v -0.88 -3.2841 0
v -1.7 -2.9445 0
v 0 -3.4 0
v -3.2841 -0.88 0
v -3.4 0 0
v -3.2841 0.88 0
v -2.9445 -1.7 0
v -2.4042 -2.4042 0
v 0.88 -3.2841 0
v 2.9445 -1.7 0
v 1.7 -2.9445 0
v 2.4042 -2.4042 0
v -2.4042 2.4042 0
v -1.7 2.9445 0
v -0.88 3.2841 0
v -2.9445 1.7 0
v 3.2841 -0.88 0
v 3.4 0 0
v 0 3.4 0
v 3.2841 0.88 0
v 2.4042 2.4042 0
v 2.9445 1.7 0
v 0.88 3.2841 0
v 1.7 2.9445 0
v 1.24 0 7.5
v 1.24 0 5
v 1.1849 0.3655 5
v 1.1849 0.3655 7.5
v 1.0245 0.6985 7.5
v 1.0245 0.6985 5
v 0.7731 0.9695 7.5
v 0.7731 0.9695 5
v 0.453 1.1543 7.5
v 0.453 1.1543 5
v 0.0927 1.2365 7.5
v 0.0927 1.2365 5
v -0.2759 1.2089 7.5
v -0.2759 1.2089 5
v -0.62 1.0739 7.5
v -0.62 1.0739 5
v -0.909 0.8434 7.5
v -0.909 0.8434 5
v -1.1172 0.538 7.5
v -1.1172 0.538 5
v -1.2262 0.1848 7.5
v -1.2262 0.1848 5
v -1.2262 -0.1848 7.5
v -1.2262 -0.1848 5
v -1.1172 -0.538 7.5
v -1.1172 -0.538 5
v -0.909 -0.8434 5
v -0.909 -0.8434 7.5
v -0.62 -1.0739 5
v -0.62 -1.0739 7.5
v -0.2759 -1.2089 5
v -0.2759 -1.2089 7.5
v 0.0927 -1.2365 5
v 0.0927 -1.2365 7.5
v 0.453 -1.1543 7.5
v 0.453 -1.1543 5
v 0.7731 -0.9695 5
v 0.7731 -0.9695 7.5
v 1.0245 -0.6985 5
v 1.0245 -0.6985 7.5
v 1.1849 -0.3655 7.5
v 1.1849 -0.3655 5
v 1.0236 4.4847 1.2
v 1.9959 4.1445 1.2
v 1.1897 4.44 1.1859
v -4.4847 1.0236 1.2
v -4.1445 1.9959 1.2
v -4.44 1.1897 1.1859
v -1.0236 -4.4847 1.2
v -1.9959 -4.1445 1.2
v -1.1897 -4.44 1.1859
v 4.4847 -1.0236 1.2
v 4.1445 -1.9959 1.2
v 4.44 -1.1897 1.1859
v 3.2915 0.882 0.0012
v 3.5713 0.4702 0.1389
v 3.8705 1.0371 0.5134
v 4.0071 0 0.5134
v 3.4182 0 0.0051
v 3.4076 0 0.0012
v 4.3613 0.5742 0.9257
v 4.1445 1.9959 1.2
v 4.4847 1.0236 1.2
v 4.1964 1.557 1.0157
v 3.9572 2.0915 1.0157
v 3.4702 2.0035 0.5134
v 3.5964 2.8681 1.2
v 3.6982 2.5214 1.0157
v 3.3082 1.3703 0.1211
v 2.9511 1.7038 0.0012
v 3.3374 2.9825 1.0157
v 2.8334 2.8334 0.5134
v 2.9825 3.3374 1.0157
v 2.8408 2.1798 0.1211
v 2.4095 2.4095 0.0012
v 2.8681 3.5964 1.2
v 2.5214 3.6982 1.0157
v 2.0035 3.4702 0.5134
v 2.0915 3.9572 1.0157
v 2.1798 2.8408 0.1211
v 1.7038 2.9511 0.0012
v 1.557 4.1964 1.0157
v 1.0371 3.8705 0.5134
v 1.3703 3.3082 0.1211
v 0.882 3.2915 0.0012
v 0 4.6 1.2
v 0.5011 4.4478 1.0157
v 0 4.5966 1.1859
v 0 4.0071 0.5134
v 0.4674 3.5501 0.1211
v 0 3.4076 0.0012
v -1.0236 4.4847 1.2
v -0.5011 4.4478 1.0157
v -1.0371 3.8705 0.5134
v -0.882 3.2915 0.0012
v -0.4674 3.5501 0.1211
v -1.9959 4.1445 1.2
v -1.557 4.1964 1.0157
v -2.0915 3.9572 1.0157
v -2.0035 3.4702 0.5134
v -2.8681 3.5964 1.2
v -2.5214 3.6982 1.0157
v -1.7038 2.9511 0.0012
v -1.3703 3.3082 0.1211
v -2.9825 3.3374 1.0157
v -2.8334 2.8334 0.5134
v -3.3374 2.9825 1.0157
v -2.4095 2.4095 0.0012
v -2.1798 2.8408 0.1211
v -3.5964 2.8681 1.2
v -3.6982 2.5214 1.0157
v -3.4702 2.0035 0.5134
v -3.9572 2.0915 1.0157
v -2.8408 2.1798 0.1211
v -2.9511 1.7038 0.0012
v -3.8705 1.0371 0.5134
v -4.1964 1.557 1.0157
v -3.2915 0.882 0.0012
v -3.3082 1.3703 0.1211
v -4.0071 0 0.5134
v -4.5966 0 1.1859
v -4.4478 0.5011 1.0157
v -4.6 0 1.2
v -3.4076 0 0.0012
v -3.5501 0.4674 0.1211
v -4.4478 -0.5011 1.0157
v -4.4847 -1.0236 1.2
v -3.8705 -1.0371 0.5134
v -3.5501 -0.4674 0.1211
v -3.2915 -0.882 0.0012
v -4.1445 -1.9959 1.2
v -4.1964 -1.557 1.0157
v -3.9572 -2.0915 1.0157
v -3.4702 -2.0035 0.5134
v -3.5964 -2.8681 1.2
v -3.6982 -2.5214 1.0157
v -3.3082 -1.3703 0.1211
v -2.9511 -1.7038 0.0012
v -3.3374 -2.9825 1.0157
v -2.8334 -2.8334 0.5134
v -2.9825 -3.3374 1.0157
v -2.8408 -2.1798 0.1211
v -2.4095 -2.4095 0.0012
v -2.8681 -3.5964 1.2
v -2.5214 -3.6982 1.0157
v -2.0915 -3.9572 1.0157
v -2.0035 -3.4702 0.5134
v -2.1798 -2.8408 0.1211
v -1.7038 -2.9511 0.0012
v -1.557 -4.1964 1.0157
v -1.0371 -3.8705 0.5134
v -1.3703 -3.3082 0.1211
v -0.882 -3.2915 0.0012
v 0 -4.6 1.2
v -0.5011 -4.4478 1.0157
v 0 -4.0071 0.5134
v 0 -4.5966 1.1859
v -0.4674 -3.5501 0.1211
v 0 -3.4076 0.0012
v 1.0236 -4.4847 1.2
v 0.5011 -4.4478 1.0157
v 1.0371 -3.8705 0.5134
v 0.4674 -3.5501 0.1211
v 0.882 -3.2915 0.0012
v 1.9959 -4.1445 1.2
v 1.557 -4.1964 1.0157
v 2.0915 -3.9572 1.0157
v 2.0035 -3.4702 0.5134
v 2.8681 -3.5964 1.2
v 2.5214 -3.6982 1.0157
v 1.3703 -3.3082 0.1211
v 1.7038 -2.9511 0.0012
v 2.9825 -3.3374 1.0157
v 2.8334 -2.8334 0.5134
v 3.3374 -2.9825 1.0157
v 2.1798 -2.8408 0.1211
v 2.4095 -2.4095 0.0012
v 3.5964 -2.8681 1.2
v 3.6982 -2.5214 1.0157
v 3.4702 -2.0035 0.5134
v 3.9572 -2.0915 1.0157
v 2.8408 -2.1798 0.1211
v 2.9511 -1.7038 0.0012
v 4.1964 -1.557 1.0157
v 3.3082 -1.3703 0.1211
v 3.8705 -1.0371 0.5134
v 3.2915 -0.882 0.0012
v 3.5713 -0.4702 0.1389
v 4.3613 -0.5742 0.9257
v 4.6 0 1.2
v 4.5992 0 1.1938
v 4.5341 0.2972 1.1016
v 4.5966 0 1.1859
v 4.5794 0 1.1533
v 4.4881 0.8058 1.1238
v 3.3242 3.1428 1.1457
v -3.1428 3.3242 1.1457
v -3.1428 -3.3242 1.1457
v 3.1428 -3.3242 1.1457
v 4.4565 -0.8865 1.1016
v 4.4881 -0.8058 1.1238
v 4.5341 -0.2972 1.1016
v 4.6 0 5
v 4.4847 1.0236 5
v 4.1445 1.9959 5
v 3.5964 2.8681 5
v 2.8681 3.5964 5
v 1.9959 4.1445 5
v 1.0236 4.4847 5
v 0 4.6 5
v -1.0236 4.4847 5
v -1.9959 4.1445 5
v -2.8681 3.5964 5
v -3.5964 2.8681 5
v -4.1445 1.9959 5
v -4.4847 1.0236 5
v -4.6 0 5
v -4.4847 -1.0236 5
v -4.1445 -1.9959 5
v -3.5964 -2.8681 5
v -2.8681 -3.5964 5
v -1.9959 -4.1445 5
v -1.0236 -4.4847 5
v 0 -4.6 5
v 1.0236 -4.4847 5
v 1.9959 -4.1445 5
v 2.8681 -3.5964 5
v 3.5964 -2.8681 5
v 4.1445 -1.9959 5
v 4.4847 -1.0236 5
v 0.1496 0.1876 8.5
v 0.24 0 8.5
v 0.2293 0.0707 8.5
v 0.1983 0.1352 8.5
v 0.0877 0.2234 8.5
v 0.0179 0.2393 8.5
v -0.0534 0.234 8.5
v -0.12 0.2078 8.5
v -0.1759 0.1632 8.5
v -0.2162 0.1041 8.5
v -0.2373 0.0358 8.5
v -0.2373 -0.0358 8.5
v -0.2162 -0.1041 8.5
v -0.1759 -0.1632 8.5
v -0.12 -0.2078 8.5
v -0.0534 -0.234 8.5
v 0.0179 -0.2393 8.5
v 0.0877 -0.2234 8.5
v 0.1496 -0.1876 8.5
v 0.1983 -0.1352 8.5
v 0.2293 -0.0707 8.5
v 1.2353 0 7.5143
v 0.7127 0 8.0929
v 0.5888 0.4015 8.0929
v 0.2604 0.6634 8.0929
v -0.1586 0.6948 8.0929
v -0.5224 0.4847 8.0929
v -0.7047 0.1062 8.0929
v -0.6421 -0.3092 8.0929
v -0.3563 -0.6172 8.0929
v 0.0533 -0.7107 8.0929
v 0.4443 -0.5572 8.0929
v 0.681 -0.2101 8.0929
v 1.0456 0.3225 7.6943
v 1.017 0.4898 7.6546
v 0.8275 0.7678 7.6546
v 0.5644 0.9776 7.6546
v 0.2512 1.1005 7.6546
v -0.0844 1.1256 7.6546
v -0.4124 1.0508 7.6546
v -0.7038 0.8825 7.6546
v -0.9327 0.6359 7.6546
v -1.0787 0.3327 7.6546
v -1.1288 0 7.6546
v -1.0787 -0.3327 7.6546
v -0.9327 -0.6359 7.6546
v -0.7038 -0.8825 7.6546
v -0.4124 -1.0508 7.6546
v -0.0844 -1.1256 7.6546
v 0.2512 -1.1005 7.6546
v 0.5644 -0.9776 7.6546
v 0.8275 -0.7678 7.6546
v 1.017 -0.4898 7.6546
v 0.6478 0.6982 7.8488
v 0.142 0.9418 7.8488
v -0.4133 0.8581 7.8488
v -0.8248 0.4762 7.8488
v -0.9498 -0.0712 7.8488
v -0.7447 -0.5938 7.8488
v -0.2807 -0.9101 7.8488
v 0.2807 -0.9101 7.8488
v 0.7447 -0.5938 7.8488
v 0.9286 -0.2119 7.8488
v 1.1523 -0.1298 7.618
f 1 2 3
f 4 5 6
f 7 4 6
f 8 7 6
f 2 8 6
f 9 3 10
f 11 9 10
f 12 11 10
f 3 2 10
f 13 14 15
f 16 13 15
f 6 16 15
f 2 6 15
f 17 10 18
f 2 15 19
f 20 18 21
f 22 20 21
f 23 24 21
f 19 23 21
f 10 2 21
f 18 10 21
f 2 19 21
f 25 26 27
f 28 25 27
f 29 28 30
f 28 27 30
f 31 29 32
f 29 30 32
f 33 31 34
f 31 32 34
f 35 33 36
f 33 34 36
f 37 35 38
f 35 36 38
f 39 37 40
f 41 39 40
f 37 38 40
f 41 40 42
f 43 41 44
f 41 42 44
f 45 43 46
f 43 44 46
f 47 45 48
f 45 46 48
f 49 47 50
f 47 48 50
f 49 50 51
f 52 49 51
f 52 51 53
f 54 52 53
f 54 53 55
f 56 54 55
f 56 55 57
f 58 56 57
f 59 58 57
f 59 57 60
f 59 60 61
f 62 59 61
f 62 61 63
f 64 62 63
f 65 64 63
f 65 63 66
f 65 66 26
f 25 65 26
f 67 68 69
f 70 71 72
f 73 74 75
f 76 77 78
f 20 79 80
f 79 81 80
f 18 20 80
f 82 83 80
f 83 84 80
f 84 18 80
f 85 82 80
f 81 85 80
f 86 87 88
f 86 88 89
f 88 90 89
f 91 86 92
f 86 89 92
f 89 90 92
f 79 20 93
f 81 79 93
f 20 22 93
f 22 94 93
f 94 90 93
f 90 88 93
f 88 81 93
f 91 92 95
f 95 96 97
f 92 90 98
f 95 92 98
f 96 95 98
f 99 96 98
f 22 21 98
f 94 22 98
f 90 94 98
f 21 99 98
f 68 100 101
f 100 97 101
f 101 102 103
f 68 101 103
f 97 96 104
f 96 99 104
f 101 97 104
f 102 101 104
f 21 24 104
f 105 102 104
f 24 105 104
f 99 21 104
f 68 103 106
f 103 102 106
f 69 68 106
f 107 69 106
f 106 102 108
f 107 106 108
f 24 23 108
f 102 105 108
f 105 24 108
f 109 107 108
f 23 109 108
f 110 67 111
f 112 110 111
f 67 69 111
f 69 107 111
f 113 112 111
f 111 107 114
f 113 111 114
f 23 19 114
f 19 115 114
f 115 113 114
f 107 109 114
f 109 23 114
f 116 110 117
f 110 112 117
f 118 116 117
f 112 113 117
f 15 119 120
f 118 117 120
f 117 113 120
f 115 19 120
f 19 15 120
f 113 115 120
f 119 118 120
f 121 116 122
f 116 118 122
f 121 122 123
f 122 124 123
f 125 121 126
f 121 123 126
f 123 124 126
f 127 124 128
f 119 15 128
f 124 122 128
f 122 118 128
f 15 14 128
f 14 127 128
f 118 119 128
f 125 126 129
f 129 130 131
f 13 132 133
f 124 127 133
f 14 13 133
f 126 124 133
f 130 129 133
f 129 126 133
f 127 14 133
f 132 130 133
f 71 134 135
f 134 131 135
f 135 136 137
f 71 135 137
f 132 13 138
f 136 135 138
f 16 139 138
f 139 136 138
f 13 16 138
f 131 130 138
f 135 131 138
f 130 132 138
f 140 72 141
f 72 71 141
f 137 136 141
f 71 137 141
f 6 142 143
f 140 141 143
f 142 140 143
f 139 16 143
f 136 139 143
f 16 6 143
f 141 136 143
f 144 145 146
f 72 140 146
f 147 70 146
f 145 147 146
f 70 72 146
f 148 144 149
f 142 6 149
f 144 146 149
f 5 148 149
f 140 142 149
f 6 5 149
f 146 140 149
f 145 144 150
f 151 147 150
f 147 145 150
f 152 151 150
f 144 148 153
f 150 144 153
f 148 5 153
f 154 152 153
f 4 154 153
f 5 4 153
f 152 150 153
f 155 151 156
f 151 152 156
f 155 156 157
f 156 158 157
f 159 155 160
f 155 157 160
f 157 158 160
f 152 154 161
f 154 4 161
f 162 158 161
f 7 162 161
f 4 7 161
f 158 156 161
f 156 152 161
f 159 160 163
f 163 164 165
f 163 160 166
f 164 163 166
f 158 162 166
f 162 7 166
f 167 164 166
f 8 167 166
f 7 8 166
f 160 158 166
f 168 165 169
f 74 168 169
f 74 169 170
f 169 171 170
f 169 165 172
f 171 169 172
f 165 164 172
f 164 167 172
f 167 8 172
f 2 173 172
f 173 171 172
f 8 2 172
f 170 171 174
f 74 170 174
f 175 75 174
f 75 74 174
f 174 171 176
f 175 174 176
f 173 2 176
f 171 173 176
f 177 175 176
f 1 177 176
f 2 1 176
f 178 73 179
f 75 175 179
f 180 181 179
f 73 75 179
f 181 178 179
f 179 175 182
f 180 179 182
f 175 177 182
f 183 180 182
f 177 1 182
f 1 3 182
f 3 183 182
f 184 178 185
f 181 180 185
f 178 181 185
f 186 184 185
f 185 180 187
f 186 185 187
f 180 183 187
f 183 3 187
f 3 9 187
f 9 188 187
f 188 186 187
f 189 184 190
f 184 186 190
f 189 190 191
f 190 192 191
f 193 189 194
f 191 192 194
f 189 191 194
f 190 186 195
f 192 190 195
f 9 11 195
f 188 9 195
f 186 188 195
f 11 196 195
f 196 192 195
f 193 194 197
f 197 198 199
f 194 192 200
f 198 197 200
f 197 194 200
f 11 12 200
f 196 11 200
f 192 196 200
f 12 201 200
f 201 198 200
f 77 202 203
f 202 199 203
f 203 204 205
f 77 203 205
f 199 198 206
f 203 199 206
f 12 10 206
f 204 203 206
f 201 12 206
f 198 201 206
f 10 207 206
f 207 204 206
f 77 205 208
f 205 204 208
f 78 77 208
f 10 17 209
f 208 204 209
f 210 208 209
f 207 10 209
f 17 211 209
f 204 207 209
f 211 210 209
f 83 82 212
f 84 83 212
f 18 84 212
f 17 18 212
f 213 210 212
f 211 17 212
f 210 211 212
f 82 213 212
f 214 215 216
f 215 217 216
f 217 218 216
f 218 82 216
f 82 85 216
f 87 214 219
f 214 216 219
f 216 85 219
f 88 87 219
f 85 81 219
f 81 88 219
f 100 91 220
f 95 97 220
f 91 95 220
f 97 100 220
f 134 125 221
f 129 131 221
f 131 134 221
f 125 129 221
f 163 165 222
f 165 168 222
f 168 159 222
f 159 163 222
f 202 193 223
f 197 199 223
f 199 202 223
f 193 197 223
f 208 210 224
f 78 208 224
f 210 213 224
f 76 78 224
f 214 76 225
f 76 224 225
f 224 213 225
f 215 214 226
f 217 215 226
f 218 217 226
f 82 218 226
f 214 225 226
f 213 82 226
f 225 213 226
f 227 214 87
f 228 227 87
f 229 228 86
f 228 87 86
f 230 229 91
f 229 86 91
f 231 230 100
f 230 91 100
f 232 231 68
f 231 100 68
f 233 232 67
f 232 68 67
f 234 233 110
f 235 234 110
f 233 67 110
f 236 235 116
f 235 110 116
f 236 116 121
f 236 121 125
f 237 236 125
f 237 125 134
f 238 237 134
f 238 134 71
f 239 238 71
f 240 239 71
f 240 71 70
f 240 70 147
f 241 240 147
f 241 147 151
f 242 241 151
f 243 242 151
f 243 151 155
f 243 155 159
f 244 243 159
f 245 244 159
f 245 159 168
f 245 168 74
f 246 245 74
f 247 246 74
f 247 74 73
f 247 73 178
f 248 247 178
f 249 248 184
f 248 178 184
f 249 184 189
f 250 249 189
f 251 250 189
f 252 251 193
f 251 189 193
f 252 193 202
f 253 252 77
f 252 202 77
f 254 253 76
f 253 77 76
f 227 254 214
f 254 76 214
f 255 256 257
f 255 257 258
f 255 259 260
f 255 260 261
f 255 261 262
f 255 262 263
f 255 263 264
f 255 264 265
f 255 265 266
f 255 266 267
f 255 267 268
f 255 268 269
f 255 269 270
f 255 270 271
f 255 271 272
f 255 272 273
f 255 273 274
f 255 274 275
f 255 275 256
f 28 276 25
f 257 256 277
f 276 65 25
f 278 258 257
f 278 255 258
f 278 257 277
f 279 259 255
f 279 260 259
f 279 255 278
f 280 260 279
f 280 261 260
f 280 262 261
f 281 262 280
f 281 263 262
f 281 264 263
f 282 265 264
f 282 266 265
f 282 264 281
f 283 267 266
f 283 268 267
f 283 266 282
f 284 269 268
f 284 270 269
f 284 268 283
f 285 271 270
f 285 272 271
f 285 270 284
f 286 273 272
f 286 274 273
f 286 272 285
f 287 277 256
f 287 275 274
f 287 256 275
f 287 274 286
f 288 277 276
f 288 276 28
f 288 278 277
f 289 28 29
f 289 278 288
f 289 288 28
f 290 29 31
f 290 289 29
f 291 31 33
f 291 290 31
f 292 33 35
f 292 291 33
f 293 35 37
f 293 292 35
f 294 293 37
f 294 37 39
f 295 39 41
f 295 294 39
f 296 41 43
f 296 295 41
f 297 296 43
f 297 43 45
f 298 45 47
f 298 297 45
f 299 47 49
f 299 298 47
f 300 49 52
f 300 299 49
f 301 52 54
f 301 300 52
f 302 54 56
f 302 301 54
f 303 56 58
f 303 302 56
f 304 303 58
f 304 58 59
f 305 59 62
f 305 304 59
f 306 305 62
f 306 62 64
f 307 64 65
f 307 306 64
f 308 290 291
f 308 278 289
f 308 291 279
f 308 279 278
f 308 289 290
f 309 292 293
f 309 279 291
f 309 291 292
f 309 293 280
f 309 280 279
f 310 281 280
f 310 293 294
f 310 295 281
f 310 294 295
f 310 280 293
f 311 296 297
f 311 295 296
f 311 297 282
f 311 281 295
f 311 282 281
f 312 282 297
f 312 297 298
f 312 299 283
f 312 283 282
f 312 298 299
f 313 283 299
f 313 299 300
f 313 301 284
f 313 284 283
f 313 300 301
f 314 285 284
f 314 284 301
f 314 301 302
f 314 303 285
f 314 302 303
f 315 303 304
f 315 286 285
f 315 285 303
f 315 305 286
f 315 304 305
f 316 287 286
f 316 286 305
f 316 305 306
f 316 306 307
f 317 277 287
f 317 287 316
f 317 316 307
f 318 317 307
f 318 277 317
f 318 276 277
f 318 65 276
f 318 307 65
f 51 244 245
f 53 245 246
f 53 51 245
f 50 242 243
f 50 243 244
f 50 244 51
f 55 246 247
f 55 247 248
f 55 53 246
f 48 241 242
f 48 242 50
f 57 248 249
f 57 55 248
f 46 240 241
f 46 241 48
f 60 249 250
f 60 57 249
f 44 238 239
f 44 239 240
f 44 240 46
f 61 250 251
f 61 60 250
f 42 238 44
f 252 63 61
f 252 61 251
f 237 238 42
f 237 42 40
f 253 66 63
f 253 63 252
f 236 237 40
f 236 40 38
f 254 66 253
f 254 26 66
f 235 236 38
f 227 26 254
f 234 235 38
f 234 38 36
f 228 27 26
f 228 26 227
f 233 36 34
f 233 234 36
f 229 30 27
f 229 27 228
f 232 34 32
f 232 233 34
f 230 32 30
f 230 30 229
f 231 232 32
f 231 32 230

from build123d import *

# Parameters (mm, degrees)
SKETCH_1_R      = 4.6
EXTRUDE_1_DEPTH = 5
SKETCH_2_R      = 1.24
EXTRUDE_2_DEPTH = 3.5
FILLET_1_SIZE   = 1
FILLET_2_SIZE   = 1.2


with BuildPart() as part:
    # 草图1 → 凸台-拉伸1 (new body)
    with BuildSketch(Plane.XY):
        Circle(SKETCH_1_R)
    extrude(amount=EXTRUDE_1_DEPTH)

    # 草图2 → 凸台-拉伸2 (add)
    with BuildSketch(Plane.XY.offset(5)):
        Circle(SKETCH_2_R)
    extrude(amount=EXTRUDE_2_DEPTH)

    # 圆角1
    # a fillet whose section is not a circle: 1 mm, written as the material it takes off along each edge
    with BuildSketch(Plane(origin=(0, 0, 8.5), x_dir=(1, 0, 0), z_dir=(0, -1, 0))) as fillet_1_piece_1:
        with BuildLine():
            Bezier((1.24, -FILLET_1_SIZE), (1.24, 0), (1.24 - FILLET_1_SIZE, 0), weights=[1, 0.070710678, 1])
            Line((1.24 - FILLET_1_SIZE, 0), (1.24, 0))
            Line((1.24, 0), (1.24, -FILLET_1_SIZE))
        make_face()
    revolve(axis=Axis((0, 0, 8.5), (0, 0, 1)), mode=Mode.SUBTRACT)

    # 圆角2
    # a fillet whose section is not a circle: 1.2 mm, written as the material it takes off along each edge
    with BuildSketch(Plane(origin=(0, 0, 0), x_dir=(1, 0, 0), z_dir=(0, -1, 0))) as fillet_2_piece_1:
        with BuildLine():
            Bezier((4.6, FILLET_2_SIZE), (4.6, 0), (4.6 - FILLET_2_SIZE, 0), weights=[1, 0.084852814, 1])
            Line((4.6 - FILLET_2_SIZE, 0), (4.6, 0))
            Line((4.6, 0), (4.6, FILLET_2_SIZE))
        make_face()
    revolve(axis=Axis((0, 0, 0), (0, 0, 1)), mode=Mode.SUBTRACT)


solid = part.part
